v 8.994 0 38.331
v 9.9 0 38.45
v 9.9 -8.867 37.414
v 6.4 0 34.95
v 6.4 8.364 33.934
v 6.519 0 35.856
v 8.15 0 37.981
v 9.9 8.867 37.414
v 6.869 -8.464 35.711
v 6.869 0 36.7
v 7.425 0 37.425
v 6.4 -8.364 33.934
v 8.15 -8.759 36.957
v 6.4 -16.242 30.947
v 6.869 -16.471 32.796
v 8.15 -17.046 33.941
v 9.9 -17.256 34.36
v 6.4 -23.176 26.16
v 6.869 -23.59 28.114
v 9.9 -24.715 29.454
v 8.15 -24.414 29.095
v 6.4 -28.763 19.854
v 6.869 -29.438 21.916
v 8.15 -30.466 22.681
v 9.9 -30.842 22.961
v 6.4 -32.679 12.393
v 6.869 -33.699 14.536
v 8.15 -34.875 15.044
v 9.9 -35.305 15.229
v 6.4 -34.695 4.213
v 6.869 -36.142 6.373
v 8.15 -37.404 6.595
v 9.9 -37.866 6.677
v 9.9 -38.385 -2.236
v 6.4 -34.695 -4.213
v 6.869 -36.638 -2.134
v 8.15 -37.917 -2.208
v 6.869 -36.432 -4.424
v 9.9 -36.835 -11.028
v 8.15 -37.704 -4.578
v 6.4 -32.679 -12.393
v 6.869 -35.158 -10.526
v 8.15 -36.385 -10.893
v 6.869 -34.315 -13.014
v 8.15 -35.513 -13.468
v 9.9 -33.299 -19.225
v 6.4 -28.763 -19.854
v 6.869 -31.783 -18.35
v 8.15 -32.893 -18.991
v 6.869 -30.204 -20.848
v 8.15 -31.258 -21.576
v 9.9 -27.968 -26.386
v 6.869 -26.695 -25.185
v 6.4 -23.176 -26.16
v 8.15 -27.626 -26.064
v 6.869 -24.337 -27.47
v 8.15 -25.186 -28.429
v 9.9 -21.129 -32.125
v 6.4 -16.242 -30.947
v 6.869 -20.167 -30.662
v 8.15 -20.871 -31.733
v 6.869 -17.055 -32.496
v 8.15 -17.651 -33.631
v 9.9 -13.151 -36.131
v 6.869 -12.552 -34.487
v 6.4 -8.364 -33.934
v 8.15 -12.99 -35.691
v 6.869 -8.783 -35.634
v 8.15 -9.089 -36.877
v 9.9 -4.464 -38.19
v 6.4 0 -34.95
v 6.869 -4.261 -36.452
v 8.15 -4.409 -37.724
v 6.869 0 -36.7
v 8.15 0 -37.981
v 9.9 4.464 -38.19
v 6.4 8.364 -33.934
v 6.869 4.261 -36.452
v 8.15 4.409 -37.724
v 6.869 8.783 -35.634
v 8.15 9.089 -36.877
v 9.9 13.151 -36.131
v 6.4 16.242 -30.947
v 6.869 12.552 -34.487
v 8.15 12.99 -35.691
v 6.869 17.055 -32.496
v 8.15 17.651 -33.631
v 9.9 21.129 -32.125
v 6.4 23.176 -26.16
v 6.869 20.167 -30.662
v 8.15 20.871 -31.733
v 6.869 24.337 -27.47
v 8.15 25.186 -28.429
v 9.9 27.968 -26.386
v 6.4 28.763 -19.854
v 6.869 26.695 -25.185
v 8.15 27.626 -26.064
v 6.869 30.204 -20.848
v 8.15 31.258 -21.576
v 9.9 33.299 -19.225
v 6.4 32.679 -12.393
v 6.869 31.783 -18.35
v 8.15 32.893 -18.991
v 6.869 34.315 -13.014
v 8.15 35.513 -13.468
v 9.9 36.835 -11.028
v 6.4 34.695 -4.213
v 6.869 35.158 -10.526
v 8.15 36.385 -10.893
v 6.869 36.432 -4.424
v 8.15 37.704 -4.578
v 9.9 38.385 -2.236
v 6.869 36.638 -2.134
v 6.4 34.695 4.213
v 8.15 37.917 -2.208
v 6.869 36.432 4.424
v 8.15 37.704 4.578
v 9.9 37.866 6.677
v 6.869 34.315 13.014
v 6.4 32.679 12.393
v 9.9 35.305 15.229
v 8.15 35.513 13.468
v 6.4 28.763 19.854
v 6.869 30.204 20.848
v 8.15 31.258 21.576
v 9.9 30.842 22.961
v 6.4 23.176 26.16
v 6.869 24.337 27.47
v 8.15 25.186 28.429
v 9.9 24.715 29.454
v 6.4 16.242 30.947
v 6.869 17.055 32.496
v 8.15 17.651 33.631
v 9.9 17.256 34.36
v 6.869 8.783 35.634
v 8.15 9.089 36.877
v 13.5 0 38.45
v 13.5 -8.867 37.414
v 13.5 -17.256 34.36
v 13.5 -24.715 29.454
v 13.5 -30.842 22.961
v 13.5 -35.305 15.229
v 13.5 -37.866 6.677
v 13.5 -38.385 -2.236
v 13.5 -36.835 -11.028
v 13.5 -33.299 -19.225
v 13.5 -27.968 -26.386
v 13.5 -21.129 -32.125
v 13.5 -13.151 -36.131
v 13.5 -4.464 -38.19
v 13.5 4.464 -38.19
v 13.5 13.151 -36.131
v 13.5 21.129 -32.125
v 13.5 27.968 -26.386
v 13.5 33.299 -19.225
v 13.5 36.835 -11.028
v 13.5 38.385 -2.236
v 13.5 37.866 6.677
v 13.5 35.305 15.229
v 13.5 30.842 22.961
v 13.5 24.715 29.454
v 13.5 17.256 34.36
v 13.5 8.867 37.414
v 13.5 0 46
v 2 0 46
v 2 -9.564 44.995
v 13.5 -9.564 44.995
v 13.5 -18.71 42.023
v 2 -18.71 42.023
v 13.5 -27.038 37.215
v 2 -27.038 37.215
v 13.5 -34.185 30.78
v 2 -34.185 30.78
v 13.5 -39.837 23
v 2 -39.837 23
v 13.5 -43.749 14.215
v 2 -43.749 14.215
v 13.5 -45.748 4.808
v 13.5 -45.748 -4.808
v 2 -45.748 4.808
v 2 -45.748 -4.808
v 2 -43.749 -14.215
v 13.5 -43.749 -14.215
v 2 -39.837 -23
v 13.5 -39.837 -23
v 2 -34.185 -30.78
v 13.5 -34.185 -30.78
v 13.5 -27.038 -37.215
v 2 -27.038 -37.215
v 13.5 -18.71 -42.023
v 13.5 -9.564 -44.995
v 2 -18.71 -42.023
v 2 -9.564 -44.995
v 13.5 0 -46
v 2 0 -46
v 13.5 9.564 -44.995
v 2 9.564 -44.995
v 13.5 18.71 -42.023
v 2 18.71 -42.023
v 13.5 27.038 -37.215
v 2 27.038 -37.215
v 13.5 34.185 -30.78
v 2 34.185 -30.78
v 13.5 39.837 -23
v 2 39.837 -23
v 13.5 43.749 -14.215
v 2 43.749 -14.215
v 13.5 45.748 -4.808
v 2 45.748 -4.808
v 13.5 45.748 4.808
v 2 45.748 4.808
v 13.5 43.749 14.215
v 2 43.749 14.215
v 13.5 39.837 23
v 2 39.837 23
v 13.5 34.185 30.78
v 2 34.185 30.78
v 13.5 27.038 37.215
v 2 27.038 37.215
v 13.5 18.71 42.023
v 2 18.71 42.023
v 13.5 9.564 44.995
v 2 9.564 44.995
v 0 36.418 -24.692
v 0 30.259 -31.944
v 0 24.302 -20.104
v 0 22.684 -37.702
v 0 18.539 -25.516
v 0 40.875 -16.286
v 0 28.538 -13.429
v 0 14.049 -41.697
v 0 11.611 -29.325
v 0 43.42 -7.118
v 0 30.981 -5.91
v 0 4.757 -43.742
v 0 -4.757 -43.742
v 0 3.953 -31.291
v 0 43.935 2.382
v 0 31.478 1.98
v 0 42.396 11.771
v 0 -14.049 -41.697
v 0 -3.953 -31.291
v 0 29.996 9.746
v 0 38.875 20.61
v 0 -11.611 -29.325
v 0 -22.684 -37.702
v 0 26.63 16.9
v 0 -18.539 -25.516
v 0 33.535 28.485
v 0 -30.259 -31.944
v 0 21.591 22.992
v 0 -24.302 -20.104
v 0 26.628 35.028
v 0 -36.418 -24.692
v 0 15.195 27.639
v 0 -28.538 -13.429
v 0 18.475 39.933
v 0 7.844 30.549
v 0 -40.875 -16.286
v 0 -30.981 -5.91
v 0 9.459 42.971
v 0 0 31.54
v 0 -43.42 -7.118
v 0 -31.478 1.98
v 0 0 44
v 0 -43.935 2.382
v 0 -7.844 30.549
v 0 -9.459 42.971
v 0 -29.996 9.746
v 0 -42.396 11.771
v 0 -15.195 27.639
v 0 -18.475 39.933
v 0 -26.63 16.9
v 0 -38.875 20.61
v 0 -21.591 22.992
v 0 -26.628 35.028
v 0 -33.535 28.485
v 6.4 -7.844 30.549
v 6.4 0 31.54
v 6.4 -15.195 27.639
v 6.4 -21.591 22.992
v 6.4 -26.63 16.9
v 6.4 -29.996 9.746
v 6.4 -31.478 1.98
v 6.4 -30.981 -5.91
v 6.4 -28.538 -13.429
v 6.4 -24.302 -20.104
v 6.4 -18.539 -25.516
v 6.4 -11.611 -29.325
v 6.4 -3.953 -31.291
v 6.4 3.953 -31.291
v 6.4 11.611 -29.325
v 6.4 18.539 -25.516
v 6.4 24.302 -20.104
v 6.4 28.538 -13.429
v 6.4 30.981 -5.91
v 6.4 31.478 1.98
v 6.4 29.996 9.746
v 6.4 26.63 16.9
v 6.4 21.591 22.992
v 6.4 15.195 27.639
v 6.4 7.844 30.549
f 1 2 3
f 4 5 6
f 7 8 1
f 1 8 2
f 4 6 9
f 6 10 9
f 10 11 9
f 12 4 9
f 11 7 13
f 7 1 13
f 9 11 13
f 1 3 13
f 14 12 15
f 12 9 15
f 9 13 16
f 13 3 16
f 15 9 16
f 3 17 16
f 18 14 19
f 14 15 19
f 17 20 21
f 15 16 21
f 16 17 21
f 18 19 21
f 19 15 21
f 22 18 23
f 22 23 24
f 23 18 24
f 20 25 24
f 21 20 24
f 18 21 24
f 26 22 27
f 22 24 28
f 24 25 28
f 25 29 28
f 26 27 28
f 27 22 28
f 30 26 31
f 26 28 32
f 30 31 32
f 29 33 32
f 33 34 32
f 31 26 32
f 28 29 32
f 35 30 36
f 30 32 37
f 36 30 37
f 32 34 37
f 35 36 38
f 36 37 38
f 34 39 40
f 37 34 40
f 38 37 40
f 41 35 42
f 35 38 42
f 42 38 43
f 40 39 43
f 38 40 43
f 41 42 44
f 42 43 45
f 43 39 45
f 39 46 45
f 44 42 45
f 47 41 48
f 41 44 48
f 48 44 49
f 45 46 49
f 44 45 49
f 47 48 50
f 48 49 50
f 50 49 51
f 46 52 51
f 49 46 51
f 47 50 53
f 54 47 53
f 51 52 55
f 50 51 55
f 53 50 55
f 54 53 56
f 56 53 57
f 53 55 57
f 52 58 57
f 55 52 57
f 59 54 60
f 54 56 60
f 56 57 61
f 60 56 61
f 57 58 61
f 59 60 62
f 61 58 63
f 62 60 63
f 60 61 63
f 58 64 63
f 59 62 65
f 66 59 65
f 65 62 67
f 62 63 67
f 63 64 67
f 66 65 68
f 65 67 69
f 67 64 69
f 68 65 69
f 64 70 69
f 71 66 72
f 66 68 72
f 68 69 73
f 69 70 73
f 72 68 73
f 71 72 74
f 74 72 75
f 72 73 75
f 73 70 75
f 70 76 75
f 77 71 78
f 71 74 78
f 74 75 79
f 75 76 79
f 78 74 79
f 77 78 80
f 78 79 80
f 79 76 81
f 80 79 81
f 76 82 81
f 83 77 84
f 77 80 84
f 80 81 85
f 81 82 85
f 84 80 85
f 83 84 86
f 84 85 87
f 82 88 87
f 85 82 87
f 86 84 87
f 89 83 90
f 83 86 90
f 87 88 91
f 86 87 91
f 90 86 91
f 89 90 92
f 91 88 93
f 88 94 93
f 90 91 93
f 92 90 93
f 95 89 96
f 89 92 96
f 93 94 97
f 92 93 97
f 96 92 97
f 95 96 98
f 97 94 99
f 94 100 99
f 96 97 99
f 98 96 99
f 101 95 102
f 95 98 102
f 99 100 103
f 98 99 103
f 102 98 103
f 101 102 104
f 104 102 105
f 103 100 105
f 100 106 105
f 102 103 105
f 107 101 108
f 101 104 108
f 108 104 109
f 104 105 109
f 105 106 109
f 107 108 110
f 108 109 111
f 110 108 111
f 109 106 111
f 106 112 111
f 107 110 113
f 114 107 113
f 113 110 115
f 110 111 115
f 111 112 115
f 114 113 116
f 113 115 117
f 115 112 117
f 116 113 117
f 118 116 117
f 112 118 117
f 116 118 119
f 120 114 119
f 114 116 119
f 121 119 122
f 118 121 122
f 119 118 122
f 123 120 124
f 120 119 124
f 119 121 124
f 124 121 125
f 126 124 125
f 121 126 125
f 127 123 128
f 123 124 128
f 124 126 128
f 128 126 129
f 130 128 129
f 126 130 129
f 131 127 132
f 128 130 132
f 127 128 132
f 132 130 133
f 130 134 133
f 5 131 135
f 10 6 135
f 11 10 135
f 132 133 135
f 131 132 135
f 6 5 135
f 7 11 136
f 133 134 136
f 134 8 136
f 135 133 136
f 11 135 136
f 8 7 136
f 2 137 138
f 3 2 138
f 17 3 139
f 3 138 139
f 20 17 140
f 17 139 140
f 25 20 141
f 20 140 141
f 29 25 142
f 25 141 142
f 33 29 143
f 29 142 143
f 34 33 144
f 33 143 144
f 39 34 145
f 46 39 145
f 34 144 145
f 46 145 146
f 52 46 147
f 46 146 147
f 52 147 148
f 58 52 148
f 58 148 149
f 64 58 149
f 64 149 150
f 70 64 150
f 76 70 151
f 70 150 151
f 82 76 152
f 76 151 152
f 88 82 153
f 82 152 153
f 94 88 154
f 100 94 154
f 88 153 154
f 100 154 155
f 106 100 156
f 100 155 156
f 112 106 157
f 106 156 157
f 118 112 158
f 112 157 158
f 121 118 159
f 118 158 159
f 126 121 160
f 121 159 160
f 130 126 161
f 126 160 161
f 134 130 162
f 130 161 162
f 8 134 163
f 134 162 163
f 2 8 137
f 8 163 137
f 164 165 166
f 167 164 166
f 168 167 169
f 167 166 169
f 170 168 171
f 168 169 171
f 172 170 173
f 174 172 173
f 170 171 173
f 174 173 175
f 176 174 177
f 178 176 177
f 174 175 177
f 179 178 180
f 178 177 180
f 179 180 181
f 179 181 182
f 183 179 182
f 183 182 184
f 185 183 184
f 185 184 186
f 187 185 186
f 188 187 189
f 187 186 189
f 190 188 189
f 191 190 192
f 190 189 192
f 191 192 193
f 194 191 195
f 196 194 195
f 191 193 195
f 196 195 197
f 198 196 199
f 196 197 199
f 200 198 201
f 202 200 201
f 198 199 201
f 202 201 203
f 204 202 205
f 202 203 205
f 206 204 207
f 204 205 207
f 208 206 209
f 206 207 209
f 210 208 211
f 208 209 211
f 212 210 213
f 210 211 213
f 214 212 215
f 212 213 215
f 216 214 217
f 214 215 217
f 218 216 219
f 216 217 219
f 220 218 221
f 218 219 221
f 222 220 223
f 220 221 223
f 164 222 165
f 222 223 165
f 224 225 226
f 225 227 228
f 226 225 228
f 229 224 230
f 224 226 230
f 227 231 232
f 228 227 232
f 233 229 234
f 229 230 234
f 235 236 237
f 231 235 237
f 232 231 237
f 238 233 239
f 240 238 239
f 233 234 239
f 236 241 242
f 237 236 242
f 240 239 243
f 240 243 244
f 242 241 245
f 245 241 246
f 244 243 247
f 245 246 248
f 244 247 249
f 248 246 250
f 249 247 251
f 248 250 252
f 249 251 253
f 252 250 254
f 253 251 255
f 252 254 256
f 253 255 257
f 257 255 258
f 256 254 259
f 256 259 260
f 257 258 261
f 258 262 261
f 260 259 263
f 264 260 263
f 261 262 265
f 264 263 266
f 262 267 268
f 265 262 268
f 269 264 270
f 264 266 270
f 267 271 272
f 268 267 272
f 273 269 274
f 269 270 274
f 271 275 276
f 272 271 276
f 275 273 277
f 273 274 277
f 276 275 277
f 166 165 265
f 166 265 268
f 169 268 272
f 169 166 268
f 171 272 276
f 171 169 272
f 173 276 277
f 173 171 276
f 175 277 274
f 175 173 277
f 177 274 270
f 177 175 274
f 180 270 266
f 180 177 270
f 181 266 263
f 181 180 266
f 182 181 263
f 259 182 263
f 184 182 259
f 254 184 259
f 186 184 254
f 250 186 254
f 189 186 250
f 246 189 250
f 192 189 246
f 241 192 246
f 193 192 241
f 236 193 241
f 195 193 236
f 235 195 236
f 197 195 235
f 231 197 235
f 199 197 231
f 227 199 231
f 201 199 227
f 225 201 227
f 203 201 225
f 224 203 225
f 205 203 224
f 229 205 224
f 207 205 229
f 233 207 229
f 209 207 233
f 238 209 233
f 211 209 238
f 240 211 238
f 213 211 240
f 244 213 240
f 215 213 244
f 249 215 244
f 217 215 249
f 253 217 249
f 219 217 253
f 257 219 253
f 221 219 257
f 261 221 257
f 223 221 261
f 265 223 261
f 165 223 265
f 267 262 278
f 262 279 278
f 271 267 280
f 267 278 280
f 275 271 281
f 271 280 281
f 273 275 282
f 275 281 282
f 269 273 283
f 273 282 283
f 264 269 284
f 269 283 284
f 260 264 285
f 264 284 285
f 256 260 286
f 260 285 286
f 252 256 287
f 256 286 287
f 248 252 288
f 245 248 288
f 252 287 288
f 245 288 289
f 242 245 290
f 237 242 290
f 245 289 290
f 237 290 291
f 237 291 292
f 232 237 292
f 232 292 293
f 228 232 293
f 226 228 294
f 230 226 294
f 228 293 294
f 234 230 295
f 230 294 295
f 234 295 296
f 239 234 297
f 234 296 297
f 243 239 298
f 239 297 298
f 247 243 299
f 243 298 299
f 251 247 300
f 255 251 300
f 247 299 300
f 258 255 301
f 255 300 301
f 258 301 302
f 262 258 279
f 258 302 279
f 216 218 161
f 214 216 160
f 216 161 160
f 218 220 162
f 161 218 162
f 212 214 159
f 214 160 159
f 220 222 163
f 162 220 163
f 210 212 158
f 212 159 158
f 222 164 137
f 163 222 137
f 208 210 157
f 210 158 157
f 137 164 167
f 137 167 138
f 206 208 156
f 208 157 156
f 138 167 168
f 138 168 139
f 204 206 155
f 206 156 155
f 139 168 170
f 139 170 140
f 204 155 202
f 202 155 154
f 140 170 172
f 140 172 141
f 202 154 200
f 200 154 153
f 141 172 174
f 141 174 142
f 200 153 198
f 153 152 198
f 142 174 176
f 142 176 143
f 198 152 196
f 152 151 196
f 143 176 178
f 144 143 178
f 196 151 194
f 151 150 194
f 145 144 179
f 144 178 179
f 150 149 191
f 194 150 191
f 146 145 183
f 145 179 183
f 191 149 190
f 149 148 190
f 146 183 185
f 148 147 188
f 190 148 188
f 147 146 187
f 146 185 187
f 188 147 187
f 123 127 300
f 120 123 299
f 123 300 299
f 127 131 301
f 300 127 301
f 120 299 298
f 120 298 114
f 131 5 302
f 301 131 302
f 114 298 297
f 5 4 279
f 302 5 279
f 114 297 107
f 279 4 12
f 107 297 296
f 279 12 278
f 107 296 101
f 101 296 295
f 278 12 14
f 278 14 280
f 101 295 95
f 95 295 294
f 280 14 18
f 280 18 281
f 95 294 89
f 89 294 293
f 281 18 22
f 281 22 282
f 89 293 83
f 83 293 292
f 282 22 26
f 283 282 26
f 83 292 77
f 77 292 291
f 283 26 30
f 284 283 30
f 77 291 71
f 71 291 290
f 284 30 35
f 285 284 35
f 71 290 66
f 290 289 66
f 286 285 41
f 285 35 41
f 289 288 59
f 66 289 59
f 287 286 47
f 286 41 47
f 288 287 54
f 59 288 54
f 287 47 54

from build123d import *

# Parameters (mm, degrees)
F3_SIZE = 2
F4_R    = 3.5


with BuildPart() as f2:
    # F1 (on Front) → F2 (revolve)
    with BuildSketch(Plane.XZ):
        Polygon((0, 46), (0, 31.54), (6.4, 31.54), (6.4, 34.95), (6.4, 38.45), (9.9, 38.45), (13.5, 38.45), (13.5, 46), align=None)
    revolve(axis=Axis((6.796166, 0, 0), (1, 0, 0)))

    # F3
    f3_edges = [f2.edges().sort_by_distance(p)[0] for p in [
        (0, 0, -46),
    ]]
    chamfer(f3_edges, length=F3_SIZE)

    # F4
    f4_edges = [f2.edges().sort_by_distance(p)[0] for p in [
        (6.4, 0, -38.45),
    ]]
    fillet(f4_edges, radius=F4_R)


solid = f2.part
